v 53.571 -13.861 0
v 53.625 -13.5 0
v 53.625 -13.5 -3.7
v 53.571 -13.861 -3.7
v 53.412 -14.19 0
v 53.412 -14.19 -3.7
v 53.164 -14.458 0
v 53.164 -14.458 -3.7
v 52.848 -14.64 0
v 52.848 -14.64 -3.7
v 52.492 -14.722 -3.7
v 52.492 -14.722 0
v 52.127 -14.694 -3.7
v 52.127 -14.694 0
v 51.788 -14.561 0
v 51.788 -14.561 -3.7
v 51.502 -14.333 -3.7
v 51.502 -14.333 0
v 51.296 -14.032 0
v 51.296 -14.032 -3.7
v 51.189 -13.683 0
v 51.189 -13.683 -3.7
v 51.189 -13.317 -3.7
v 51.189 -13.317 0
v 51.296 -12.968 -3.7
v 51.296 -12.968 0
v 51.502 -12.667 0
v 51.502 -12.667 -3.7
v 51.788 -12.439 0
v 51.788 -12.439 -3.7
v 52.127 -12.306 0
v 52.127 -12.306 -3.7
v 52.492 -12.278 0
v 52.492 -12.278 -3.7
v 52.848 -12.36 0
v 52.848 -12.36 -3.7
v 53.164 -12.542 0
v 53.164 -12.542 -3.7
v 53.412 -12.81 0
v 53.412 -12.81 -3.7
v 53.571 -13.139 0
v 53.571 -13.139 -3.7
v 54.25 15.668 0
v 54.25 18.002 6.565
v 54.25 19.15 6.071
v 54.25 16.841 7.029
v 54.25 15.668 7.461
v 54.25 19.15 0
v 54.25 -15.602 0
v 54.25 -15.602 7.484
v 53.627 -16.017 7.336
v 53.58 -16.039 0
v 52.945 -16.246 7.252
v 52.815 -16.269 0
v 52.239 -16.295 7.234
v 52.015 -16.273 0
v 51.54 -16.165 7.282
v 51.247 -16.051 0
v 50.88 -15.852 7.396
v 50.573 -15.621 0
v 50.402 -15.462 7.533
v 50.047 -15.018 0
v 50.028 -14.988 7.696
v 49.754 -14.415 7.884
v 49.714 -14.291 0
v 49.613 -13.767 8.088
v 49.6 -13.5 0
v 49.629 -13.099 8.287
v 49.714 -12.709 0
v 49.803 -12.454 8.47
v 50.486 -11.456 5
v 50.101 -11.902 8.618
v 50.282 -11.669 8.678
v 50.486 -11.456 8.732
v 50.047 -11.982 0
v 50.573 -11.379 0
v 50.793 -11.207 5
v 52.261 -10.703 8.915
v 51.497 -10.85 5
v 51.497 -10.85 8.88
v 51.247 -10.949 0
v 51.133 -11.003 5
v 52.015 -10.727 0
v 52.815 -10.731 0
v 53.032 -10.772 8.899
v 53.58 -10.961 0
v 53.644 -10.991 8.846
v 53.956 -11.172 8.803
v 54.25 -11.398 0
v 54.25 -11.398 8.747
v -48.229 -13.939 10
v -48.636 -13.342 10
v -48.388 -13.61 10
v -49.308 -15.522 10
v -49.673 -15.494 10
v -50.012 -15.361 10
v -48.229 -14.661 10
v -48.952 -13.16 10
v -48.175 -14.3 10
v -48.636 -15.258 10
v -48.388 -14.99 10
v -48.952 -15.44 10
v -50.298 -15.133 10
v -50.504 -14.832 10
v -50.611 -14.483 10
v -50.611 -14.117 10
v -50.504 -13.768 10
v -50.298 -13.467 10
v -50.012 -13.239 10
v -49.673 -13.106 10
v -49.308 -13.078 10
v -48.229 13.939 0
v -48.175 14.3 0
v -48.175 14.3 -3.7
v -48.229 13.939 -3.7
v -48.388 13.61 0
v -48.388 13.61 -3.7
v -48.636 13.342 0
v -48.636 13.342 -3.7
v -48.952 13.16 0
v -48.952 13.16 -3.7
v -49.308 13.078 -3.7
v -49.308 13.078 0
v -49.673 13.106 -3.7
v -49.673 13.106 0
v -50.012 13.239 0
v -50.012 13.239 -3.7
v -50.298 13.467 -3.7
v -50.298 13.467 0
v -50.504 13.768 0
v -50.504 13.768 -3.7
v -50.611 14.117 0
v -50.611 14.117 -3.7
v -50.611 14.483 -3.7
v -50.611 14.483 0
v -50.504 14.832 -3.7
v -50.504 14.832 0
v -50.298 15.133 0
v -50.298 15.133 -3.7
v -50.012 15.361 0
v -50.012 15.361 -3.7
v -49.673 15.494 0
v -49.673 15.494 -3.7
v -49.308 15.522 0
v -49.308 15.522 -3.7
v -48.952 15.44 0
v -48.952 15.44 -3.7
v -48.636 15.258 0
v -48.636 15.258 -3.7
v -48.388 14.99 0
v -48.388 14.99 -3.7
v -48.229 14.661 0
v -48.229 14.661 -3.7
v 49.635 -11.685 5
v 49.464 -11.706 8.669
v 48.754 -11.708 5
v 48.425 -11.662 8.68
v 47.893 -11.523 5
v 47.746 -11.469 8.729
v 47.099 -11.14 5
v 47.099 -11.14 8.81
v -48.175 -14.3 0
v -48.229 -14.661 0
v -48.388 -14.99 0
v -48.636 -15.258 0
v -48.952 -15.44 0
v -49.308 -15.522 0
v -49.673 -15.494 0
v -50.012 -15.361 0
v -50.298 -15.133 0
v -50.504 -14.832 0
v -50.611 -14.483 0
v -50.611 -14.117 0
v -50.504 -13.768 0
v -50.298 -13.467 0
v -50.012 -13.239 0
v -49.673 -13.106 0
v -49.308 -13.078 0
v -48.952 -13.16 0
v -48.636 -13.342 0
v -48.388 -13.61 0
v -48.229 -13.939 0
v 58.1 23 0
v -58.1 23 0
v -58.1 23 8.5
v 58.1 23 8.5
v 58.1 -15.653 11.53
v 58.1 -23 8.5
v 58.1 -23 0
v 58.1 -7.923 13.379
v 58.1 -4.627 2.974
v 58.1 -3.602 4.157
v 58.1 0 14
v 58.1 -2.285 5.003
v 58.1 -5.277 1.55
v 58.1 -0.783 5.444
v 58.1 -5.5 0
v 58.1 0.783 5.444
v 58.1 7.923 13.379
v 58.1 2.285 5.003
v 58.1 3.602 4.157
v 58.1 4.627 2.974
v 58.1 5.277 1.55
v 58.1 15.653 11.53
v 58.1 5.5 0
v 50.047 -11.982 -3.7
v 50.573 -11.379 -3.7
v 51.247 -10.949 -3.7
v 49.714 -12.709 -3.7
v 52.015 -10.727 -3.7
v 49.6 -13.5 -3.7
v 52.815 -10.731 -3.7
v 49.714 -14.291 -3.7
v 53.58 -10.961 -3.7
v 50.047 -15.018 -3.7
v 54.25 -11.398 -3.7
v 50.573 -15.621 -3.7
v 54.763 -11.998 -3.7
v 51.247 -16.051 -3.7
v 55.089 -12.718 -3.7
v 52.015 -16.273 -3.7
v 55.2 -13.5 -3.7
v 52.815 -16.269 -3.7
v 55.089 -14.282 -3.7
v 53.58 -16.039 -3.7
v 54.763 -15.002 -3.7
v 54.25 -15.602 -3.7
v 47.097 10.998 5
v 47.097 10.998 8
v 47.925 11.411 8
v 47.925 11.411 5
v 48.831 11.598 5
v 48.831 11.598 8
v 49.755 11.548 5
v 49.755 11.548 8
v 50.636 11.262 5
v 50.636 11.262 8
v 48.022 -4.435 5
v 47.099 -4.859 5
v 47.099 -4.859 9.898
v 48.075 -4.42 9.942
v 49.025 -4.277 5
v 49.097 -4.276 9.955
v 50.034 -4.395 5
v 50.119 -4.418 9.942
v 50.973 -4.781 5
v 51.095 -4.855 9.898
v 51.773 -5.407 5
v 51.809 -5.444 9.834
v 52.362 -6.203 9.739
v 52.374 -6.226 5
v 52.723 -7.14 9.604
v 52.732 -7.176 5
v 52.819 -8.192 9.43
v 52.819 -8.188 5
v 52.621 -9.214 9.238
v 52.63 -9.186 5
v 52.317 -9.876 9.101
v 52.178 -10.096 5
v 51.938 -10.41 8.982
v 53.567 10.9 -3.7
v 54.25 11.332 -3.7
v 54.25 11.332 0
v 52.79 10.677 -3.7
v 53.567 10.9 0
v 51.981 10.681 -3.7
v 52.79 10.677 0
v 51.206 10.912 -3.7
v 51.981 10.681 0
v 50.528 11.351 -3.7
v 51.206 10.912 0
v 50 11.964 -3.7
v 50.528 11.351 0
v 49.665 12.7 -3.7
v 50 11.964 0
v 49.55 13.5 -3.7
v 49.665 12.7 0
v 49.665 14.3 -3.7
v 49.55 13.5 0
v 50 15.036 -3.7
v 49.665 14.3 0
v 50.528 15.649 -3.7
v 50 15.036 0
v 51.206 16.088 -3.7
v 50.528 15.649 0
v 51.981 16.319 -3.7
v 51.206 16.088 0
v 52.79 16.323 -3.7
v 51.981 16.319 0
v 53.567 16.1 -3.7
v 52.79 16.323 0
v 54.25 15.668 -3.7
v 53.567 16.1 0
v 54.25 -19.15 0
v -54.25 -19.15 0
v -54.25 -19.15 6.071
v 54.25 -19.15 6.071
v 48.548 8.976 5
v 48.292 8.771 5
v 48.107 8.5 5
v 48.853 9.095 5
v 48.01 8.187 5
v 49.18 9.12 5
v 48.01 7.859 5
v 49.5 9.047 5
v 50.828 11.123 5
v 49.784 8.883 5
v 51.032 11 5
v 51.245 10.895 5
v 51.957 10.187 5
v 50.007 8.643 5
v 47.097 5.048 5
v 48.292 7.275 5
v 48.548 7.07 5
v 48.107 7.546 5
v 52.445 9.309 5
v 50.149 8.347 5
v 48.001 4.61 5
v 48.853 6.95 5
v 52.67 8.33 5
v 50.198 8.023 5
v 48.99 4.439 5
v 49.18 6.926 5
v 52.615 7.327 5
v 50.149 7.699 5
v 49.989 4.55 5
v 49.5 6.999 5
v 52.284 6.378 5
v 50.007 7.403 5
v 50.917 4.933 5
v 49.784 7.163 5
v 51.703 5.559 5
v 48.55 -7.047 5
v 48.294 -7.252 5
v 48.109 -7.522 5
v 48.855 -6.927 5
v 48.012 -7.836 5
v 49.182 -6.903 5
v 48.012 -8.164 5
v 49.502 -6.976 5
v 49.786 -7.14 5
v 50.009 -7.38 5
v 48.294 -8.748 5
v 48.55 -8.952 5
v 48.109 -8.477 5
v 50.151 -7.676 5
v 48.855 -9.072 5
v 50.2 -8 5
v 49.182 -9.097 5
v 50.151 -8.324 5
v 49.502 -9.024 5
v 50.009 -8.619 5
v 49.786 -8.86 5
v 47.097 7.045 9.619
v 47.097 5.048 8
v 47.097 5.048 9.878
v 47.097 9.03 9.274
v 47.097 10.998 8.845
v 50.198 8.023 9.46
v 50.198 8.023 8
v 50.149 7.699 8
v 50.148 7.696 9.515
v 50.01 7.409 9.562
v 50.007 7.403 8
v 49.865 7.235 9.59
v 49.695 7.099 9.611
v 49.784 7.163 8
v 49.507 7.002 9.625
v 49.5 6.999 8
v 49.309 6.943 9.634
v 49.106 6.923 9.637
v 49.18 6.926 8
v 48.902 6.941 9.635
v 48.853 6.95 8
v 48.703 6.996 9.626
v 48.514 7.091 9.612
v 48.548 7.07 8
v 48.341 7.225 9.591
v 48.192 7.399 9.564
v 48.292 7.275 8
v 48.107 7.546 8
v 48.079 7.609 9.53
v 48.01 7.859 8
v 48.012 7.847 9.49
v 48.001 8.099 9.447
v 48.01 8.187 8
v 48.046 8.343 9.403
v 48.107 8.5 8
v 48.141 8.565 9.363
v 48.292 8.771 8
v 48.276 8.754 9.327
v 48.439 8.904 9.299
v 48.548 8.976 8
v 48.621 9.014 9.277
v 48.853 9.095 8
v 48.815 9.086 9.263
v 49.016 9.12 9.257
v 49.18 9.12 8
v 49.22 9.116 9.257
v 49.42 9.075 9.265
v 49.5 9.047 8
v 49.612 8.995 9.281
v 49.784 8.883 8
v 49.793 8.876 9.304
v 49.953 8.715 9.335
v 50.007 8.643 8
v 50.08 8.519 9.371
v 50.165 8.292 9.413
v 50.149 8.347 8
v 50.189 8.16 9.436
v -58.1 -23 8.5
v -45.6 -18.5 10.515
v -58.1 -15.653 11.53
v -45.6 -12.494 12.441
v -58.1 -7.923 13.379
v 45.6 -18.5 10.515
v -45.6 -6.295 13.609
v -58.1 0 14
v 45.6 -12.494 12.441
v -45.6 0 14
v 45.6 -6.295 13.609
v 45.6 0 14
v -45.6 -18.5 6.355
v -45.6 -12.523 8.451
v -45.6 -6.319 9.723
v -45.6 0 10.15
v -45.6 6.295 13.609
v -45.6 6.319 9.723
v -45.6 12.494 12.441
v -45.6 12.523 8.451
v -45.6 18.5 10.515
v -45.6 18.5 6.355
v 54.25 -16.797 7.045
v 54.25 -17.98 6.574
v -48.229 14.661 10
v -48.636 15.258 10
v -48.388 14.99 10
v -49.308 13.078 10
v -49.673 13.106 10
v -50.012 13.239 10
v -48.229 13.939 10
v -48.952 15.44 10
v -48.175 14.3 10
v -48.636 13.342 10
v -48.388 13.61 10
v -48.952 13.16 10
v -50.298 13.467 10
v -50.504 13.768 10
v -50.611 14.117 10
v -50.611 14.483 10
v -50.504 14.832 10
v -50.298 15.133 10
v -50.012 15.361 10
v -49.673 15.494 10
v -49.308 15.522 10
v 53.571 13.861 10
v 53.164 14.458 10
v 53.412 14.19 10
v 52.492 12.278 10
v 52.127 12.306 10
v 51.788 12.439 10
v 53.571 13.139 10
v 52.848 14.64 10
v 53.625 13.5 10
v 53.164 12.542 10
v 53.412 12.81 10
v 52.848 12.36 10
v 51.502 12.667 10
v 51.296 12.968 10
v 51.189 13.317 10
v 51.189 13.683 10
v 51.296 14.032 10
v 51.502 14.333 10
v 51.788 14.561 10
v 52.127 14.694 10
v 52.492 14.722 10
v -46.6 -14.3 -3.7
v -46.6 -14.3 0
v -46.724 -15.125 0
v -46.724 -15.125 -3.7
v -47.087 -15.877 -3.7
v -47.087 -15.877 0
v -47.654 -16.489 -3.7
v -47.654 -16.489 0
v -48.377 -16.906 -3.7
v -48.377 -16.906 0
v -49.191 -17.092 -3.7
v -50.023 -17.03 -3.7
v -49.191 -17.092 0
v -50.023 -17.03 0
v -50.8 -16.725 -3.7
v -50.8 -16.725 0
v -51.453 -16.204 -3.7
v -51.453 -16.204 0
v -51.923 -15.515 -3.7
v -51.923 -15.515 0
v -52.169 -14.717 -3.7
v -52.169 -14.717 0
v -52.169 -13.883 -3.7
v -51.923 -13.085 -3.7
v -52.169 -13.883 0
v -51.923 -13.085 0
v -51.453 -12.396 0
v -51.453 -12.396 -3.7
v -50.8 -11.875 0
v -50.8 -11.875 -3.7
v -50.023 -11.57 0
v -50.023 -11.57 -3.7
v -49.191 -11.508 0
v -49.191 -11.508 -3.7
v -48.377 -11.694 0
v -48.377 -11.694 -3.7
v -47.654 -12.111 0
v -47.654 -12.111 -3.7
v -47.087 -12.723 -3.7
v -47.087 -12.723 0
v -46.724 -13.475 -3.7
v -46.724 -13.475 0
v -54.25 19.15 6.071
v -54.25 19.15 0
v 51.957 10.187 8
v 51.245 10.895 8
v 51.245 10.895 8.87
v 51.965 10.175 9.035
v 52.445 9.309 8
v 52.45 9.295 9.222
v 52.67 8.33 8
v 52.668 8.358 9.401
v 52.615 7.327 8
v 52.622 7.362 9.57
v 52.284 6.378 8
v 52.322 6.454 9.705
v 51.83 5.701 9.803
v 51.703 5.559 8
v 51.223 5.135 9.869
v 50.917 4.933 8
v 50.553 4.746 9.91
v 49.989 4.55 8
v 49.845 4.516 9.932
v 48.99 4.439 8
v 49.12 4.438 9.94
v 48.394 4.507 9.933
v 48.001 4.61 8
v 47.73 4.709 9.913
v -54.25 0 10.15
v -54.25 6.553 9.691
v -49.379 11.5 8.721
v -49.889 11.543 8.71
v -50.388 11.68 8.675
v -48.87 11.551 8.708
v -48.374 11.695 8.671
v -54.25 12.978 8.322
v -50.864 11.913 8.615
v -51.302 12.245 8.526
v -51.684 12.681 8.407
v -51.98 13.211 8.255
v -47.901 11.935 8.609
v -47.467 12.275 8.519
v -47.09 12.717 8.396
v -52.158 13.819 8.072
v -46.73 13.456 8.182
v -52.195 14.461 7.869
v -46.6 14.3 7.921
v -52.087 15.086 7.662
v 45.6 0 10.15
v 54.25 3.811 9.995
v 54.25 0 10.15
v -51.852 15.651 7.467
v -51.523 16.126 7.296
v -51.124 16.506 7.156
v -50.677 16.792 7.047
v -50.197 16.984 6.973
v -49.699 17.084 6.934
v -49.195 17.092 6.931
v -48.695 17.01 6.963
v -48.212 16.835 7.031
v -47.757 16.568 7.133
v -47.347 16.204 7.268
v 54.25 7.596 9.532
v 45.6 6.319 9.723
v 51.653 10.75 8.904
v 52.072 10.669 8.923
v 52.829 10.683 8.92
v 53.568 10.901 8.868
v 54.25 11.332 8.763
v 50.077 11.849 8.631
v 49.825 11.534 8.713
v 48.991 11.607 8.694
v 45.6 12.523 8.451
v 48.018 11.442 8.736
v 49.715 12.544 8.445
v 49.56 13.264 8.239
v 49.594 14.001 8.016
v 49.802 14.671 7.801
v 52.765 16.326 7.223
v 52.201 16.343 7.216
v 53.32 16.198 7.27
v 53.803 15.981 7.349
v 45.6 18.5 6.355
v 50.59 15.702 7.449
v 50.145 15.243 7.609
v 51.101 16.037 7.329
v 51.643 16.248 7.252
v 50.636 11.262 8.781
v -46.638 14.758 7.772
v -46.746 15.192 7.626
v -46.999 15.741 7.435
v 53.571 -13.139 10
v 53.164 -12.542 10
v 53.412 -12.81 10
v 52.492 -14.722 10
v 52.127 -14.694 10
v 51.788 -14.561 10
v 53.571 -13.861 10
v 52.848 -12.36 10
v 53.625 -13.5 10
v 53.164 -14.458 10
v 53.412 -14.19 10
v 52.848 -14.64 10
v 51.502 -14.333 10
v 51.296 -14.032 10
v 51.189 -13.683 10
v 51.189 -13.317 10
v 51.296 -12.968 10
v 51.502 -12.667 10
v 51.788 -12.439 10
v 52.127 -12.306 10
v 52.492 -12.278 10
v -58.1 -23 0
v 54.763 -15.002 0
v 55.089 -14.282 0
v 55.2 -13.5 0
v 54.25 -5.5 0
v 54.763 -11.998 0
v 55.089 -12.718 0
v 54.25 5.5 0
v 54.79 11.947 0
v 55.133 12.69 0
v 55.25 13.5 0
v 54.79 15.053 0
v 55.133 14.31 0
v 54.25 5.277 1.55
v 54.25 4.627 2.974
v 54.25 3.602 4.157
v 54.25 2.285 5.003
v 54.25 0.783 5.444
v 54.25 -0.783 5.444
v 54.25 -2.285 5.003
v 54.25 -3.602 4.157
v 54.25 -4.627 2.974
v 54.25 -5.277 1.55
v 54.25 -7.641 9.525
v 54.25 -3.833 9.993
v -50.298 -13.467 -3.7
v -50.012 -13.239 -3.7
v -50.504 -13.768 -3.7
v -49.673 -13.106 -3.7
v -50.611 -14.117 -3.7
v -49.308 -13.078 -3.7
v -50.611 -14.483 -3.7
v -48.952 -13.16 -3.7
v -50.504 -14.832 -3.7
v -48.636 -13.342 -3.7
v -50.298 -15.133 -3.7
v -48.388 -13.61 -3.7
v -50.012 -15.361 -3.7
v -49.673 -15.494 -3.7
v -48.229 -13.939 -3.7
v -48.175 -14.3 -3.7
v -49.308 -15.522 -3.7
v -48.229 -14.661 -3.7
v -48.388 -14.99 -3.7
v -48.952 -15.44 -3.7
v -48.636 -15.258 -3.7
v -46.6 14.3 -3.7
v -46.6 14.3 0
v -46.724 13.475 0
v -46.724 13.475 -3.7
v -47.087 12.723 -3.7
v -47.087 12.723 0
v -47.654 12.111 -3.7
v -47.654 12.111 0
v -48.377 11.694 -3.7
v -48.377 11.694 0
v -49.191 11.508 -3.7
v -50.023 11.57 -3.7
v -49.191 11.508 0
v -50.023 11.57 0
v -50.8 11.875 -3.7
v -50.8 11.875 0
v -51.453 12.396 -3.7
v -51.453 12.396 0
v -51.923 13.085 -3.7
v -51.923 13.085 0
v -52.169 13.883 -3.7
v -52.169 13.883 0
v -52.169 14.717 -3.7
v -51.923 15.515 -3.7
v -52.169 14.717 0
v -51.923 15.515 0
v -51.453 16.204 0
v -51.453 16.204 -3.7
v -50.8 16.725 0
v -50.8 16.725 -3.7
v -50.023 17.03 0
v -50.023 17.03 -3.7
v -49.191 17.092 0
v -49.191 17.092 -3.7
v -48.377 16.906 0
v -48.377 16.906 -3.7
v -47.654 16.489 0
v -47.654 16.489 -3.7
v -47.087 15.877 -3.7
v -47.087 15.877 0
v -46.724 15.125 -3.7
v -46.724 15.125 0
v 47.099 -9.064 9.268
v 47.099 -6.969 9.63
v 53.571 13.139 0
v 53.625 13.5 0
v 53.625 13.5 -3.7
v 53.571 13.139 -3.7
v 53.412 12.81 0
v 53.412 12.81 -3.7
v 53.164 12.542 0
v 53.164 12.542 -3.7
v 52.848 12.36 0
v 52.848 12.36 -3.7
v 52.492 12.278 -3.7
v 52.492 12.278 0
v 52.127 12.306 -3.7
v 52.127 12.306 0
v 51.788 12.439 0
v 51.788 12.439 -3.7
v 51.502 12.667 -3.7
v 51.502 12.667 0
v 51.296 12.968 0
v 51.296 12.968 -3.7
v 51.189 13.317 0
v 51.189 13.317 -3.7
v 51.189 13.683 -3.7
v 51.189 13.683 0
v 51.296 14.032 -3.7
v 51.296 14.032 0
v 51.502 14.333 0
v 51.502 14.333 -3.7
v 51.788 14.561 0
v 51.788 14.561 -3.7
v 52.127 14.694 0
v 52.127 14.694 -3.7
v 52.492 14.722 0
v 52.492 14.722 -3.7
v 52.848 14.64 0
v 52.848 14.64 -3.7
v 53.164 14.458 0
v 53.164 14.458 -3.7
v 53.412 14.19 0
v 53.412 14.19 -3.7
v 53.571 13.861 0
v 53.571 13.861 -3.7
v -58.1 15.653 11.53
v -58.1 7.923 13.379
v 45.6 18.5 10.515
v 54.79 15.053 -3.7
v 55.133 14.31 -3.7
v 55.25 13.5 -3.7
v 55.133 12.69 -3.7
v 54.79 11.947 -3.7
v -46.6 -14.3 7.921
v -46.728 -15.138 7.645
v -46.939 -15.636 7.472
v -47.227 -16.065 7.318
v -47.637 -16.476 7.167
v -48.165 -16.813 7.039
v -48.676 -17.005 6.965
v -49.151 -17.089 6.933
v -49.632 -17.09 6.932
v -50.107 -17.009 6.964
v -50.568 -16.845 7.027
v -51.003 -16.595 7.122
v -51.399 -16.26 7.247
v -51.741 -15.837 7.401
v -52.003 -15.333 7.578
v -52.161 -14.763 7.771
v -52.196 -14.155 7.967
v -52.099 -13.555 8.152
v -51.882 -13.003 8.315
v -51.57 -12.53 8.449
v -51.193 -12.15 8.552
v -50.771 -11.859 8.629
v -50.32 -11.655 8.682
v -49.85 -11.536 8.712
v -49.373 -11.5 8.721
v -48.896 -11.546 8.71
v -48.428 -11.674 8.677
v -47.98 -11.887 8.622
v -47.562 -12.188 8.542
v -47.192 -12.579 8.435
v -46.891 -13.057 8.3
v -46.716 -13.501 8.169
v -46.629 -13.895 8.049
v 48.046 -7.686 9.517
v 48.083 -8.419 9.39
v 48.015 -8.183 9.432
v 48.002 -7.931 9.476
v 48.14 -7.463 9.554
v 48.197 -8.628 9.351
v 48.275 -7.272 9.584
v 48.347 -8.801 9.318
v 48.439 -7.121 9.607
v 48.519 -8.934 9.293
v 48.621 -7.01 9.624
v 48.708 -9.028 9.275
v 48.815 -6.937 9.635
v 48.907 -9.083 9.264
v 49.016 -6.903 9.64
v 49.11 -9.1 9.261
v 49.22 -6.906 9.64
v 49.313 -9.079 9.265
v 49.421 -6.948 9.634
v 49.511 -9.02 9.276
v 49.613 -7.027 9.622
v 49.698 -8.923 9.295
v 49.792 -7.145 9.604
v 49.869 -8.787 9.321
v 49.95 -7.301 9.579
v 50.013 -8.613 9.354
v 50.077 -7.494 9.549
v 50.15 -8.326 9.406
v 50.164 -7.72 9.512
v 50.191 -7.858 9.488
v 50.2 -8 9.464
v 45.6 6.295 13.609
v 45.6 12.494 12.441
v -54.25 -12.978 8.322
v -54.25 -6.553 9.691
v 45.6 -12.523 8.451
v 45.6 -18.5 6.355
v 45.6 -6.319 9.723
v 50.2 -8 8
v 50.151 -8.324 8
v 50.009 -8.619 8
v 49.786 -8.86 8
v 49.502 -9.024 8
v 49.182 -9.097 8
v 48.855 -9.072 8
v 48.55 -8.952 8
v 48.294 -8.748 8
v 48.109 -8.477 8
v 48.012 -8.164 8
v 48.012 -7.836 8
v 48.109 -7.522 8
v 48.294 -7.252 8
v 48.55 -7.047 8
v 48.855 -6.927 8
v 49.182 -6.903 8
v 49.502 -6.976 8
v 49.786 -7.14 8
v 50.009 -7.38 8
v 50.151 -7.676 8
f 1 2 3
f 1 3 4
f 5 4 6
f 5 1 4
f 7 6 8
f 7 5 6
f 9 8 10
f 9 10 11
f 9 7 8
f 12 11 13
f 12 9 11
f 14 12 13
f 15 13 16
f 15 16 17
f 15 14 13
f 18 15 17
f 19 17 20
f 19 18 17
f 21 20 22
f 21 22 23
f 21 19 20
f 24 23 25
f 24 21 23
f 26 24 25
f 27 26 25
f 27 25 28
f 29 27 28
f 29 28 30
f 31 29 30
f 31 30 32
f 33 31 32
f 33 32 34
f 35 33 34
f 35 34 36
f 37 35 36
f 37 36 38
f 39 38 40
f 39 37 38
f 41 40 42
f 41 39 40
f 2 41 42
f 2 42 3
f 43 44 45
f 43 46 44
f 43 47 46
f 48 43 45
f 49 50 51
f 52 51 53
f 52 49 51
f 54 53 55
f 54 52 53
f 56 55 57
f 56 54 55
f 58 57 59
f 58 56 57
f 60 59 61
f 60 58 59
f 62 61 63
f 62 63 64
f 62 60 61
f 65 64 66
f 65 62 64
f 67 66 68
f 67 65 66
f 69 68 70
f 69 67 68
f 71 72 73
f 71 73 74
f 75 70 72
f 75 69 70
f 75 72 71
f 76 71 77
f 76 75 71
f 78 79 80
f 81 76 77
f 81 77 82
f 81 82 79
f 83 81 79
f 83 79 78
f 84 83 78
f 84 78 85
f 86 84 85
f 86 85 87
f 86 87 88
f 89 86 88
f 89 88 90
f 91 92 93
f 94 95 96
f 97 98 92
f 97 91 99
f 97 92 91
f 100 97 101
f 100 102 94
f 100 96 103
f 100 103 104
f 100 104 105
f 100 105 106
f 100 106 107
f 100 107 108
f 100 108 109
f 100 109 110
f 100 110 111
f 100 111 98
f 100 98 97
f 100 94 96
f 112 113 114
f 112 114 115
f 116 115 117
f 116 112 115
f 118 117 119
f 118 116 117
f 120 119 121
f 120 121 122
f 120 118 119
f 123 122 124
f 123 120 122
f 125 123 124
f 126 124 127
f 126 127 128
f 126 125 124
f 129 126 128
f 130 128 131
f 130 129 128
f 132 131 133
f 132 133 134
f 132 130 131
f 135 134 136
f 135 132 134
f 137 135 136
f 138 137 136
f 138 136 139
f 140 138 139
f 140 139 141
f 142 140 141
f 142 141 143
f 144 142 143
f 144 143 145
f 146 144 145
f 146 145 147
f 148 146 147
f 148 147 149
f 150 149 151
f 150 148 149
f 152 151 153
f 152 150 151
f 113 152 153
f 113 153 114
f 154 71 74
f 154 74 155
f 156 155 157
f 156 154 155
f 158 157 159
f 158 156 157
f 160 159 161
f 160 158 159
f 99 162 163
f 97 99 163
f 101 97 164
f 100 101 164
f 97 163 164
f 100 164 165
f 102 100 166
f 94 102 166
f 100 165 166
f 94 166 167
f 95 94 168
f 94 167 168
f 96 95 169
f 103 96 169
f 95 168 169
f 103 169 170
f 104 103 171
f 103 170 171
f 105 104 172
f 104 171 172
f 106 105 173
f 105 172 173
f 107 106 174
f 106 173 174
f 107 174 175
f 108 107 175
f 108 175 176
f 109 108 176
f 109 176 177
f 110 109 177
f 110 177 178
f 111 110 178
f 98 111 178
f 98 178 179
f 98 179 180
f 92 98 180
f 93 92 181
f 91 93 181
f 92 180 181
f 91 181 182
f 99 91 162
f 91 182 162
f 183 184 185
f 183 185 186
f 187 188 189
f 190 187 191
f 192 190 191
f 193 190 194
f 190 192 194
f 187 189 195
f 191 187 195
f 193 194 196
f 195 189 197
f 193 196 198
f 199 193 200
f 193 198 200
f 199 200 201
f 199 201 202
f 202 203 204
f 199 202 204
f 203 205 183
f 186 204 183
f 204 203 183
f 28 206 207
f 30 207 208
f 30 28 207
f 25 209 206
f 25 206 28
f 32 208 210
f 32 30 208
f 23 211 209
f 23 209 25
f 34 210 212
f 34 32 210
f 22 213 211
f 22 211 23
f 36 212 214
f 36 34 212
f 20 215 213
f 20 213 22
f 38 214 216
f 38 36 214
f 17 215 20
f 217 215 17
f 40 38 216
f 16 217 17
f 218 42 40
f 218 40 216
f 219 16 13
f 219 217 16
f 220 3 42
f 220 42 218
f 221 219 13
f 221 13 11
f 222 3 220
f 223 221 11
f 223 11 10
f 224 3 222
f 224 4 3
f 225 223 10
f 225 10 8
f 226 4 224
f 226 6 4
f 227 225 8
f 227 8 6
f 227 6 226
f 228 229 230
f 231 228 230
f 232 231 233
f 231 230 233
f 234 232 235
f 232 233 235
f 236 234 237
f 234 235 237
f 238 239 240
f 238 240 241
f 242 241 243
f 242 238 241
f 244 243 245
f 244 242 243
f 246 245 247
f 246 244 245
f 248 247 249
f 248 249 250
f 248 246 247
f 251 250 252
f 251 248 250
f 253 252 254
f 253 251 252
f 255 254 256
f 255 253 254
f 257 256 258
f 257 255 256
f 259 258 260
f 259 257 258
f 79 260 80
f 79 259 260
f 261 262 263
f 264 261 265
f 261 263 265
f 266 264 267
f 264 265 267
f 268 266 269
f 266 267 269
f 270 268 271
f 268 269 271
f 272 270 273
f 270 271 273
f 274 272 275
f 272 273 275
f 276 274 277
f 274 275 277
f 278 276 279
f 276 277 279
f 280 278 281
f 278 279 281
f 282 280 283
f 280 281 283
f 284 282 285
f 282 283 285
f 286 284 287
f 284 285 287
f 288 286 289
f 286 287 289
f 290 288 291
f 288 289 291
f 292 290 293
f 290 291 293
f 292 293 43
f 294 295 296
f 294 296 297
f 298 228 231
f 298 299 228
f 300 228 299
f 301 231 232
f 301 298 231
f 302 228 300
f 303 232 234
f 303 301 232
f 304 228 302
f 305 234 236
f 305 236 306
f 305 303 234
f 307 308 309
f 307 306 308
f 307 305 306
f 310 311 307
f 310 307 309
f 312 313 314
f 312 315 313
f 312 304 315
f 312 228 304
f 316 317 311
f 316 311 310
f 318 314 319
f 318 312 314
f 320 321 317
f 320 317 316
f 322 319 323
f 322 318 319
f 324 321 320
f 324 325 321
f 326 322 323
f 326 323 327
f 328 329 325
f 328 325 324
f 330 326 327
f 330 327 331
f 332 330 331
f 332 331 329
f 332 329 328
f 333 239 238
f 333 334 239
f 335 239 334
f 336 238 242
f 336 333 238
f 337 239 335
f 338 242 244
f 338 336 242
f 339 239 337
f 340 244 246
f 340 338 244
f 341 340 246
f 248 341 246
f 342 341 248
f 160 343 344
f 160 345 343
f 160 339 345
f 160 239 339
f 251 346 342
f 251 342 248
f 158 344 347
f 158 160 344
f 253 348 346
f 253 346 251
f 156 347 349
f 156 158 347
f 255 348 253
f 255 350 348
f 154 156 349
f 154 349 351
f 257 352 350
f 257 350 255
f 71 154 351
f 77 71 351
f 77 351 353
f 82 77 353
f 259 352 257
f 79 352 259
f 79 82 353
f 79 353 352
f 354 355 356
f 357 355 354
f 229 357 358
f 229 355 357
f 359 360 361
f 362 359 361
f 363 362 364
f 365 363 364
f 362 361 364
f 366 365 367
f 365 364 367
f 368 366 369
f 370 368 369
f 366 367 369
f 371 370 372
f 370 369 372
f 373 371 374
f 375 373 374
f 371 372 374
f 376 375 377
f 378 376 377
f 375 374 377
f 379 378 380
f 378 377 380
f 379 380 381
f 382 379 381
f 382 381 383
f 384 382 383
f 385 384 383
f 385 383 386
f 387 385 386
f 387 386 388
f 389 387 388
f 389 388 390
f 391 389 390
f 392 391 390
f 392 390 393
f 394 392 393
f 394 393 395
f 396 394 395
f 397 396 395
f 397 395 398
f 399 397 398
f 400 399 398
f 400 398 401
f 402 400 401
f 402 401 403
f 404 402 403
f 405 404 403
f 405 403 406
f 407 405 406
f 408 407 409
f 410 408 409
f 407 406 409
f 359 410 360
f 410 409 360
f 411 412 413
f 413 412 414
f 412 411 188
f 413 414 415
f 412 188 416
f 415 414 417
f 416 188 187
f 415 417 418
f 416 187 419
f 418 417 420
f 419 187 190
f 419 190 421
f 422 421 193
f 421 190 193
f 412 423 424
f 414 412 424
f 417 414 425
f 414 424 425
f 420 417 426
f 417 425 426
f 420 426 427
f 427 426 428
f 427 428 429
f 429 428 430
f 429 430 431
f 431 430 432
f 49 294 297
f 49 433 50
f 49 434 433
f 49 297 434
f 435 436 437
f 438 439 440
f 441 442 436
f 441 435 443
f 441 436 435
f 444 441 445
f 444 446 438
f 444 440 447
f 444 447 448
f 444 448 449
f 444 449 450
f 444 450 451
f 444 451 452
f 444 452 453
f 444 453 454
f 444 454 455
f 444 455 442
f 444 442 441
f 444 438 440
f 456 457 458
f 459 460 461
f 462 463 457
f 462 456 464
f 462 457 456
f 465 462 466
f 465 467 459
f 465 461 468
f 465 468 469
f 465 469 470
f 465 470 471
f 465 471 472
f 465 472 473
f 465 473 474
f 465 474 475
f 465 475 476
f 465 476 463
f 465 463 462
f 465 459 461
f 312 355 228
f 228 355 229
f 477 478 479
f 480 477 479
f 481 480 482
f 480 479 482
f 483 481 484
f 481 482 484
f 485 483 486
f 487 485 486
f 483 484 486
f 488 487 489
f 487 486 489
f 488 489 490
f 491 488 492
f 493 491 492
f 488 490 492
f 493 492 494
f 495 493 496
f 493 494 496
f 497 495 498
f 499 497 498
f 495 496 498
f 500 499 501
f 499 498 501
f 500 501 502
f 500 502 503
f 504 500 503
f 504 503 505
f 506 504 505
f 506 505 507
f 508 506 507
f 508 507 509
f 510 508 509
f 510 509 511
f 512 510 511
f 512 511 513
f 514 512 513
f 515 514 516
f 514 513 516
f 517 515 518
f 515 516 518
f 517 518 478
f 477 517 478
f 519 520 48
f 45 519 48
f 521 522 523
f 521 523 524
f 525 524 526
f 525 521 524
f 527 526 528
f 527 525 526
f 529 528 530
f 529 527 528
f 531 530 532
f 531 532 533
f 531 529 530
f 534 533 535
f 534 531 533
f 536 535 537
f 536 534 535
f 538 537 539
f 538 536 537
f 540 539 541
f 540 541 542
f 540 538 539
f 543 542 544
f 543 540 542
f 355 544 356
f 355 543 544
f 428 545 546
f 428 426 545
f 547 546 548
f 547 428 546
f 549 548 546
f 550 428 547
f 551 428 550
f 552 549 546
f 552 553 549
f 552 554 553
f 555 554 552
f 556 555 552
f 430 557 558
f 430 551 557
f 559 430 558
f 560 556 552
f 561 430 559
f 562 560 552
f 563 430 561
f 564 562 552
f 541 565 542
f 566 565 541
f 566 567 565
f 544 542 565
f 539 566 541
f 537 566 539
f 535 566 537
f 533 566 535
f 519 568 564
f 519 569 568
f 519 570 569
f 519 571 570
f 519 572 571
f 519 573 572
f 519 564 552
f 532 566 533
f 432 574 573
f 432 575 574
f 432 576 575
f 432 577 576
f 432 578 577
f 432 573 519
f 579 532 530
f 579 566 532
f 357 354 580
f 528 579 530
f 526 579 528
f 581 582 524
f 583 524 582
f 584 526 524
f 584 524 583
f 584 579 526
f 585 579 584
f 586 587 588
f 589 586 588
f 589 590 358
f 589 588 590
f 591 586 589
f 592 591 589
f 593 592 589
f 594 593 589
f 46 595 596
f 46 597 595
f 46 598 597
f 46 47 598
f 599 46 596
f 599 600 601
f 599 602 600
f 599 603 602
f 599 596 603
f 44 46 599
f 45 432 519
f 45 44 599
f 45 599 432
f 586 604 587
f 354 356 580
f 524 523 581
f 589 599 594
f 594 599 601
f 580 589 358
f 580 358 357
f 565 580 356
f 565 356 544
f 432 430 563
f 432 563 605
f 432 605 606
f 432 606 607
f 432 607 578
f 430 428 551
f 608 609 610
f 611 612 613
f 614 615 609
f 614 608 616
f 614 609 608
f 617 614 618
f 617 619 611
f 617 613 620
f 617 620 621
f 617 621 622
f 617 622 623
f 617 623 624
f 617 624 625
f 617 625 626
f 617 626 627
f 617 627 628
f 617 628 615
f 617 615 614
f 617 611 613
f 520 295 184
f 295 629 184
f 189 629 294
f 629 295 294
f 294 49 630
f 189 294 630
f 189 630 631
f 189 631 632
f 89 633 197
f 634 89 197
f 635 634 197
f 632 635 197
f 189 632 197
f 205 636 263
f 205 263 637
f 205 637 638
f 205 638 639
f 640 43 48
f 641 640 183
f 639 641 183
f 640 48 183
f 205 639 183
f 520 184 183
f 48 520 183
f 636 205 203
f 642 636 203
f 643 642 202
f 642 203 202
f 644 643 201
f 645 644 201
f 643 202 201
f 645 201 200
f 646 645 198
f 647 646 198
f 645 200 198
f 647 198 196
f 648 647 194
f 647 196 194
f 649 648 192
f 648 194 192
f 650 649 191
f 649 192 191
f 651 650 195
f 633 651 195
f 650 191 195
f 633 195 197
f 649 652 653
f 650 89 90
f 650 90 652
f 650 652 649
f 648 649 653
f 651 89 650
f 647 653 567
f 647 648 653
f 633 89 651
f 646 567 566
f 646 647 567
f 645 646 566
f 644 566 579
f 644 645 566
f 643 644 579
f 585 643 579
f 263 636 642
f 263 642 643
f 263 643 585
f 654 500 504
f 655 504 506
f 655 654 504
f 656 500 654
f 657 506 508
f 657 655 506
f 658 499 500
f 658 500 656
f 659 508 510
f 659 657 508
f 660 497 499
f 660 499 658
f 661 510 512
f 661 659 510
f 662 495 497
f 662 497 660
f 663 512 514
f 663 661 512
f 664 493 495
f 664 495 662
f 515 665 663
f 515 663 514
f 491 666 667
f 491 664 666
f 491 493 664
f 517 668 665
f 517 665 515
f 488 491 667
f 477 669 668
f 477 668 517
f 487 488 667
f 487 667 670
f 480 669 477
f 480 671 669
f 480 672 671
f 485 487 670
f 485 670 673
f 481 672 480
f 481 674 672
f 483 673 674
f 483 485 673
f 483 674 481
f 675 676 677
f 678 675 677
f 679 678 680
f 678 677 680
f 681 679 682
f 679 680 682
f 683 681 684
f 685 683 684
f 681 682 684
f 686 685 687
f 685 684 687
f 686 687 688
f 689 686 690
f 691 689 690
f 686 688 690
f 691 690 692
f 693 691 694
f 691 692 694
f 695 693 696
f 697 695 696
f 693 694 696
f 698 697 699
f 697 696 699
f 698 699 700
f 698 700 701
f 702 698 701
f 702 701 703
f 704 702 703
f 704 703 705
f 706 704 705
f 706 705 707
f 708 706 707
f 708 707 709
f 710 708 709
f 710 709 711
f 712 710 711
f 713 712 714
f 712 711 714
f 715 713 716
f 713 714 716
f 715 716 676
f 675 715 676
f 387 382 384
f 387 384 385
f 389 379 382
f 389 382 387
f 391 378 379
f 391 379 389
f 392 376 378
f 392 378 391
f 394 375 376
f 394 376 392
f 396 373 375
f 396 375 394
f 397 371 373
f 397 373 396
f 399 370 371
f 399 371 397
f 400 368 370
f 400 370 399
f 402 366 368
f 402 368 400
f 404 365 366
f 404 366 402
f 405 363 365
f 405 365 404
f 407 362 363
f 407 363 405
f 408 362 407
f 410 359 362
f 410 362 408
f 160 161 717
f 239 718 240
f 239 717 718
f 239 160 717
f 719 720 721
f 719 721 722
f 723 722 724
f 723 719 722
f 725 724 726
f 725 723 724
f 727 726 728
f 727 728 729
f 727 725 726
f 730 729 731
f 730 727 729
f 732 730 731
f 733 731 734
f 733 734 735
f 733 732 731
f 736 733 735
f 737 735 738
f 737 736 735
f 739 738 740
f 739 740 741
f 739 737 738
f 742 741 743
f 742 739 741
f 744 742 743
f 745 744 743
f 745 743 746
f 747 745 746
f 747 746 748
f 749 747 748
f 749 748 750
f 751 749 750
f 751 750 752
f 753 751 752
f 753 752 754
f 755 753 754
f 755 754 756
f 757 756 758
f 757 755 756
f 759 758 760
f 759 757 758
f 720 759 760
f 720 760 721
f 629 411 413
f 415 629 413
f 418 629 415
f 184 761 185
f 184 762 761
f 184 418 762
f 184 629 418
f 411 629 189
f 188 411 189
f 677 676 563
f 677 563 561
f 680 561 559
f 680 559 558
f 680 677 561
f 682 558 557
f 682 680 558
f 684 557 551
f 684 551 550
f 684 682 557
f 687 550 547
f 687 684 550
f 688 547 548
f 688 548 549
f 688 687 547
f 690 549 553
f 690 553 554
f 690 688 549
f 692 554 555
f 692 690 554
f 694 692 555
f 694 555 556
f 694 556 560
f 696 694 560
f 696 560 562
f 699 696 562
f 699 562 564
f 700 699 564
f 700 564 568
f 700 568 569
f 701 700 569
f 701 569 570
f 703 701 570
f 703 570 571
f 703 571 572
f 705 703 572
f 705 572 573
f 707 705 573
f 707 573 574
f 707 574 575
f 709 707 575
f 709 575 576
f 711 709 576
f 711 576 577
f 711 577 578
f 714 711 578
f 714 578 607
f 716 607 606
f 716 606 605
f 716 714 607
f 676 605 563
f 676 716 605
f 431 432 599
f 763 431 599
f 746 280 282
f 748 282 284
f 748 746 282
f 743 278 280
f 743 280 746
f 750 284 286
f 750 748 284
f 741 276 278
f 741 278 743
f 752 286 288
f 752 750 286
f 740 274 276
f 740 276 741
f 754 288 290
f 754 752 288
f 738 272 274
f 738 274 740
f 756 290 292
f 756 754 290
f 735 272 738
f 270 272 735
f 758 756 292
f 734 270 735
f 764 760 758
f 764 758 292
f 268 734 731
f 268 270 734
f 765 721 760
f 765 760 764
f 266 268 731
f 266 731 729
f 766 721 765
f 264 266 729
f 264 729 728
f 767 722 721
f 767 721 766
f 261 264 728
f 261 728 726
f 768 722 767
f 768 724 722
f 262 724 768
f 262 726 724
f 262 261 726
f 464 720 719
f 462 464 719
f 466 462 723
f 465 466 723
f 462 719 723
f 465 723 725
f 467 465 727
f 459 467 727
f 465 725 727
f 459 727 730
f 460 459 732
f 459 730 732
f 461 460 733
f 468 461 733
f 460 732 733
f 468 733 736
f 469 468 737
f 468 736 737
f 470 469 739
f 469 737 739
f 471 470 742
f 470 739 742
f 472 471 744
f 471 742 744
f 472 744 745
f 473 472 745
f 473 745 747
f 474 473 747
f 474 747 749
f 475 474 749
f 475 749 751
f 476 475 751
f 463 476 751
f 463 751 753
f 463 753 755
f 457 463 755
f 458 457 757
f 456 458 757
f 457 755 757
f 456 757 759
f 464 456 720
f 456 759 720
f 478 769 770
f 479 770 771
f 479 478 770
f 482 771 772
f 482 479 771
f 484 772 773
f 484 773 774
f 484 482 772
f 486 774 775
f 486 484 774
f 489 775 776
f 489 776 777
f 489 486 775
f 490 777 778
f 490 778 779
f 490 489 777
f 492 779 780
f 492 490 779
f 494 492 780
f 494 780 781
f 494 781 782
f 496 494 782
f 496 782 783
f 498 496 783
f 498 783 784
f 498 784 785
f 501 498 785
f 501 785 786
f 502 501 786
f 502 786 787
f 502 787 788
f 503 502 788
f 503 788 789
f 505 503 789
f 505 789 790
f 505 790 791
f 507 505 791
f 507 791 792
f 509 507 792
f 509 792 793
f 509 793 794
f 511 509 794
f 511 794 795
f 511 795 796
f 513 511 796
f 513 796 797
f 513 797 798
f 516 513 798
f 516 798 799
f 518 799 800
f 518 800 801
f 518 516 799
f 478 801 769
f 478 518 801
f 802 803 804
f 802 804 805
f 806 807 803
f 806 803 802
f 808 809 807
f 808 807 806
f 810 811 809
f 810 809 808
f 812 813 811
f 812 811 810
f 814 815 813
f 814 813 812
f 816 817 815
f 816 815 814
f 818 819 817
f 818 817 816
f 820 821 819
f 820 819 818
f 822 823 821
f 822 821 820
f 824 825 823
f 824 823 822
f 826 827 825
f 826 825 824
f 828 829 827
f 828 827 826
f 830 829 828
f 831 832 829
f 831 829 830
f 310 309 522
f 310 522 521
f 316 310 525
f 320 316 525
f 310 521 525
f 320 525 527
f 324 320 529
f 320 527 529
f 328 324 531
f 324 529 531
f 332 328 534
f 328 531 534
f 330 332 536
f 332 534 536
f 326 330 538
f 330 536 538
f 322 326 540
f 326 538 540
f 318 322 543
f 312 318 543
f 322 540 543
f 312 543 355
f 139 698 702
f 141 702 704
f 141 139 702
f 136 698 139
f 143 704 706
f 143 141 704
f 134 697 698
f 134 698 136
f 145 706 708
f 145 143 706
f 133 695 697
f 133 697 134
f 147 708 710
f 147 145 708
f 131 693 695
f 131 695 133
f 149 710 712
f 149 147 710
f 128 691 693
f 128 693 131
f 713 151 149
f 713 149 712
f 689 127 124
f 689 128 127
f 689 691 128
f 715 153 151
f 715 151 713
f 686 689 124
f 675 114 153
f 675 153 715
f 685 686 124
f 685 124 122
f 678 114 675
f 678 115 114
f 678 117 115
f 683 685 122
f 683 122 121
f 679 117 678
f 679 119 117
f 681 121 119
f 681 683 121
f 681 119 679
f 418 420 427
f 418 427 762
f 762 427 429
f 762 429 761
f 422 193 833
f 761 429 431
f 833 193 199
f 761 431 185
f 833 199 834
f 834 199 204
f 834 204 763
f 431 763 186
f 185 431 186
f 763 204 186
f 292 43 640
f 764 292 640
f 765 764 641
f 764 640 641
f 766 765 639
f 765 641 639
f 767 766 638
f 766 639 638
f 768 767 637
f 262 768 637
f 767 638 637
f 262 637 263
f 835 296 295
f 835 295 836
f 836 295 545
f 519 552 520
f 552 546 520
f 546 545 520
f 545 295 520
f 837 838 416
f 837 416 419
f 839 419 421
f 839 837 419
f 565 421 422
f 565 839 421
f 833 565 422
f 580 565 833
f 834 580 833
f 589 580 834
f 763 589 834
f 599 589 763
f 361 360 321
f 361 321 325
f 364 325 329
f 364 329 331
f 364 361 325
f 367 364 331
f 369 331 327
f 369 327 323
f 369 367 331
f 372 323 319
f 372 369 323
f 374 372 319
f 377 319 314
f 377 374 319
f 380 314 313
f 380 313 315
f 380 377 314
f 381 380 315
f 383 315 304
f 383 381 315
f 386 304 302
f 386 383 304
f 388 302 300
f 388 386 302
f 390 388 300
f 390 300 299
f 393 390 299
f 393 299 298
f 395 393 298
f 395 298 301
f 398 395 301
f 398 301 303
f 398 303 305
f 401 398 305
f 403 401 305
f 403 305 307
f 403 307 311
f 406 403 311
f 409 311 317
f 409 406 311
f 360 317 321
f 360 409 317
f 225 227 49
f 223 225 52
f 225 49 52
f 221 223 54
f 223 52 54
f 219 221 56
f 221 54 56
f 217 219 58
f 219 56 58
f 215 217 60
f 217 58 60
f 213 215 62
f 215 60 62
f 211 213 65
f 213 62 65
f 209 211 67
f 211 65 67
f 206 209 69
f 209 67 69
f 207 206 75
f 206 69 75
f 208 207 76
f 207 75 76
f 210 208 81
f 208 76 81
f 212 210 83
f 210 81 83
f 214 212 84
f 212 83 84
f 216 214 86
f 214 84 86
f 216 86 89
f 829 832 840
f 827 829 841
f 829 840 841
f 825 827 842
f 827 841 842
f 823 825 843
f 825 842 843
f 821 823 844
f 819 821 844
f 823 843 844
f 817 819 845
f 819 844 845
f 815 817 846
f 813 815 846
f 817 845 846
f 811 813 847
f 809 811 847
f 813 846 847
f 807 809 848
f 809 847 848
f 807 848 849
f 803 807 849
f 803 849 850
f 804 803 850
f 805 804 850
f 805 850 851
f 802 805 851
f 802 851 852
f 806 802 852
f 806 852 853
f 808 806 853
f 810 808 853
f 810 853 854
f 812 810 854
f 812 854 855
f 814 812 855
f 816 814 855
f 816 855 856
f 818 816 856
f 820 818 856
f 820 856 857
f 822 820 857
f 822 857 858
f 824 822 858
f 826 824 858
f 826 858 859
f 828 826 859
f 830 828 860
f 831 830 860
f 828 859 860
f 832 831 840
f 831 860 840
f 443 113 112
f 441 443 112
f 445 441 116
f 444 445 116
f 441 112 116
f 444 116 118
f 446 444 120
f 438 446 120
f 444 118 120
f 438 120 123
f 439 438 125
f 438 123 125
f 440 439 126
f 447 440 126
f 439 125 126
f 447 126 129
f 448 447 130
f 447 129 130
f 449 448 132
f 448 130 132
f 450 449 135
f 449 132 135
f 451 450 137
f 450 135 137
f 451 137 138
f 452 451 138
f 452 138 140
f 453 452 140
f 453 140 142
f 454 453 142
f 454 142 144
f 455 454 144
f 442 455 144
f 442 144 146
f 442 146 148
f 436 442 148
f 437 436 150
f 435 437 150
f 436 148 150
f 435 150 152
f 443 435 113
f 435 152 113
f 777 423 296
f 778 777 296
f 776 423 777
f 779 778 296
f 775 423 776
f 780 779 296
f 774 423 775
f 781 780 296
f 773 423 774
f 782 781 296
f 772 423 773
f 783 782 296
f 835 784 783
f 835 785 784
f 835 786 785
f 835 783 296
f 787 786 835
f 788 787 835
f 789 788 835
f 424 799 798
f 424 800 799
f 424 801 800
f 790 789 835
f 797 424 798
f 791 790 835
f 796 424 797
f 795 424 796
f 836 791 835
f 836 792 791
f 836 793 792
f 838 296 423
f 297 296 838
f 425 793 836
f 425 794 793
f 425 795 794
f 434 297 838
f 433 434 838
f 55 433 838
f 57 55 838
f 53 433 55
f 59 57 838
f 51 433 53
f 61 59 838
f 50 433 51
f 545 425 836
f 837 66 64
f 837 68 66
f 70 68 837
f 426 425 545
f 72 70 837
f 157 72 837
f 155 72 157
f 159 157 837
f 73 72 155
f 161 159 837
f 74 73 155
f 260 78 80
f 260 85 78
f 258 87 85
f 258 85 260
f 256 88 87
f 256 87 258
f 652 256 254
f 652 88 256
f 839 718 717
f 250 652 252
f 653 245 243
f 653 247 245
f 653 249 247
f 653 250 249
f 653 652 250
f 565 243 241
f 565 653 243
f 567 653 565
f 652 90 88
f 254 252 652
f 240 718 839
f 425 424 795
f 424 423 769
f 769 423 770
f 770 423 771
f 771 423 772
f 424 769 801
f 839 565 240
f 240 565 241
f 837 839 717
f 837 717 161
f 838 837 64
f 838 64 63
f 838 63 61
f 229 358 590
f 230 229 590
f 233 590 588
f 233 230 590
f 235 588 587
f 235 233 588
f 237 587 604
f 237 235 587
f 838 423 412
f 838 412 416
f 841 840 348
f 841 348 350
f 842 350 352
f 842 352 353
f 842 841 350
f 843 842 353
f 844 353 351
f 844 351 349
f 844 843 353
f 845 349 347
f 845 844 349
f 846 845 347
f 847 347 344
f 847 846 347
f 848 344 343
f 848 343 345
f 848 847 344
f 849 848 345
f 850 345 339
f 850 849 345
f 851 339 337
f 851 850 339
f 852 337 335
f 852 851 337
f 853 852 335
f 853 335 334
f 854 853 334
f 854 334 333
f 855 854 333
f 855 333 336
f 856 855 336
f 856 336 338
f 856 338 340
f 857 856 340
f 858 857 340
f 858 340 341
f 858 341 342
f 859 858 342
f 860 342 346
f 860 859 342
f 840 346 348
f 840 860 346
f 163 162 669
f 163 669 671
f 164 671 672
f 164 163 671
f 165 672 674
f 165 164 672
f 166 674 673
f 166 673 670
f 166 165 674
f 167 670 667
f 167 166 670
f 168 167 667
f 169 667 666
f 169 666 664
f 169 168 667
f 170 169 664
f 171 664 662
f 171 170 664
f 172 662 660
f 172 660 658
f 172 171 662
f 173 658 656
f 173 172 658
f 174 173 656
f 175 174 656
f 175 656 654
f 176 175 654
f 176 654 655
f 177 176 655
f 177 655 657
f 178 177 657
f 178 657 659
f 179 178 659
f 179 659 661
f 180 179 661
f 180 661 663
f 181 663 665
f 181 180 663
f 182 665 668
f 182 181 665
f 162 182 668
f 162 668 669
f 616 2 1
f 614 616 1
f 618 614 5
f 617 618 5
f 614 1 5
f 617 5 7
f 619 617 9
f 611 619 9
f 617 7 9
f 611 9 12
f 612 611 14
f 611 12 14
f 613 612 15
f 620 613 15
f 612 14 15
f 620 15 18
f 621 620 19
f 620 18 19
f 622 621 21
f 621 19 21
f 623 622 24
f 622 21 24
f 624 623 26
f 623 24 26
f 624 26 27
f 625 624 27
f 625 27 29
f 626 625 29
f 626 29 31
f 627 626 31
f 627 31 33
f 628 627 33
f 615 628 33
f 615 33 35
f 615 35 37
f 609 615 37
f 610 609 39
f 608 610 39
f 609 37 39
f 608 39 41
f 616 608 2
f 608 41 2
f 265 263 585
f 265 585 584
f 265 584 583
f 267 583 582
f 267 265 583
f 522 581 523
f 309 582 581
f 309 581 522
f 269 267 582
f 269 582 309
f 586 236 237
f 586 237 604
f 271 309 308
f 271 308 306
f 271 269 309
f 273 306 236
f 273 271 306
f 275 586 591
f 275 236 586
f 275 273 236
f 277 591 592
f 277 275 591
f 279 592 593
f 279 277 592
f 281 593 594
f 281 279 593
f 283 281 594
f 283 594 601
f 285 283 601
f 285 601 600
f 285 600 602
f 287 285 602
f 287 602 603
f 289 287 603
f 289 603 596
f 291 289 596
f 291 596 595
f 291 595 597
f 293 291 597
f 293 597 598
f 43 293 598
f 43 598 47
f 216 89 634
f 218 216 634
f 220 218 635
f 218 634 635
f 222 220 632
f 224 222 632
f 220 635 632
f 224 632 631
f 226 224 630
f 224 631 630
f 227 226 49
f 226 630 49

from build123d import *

# Parameters (mm, degrees)
F0_W           = 116.2
F0_H           = 46
F0_W_2         = 91.2
F0_H_2         = 37
F1_DEPTH       = 14
F3_DEPTH       = 116.201
F4_T           = -3.85
F5_W           = 91.2
F5_H           = 37
F6_DEPTH       = 14.001
F7_R           = 2.8
F7_R_2         = 2.85
F10_DEPTH      = 25
F11_R          = 1.225
F12_DEPTH      = 10
F14_R          = 1.1
F15_DEPTH      = 3
F15_DEPTH_BACK = 1.955065151
F16_R          = 1.225
F16_R_2        = 2.8
F17_DEPTH      = 3.7


with BuildPart() as f1:
    # F0 (on Top) → F1 (new body)
    with BuildSketch(Plane.XY):
        Rectangle(F0_W, F0_H)
        Rectangle(F0_W_2, F0_H_2, mode=Mode.SUBTRACT)
        Rectangle(F0_W_2, F0_H_2)
    extrude(amount=F1_DEPTH)

    # F2 (on face) → F3 (cut, through all)
    with BuildSketch(Plane.YZ.offset(58.1)):
        Polygon((23, 14), (23, 8.5), (26.9685778767, 8.2080848515), (26.9685778767, 18.4987988323), (-26.2719616294, 18.4987988323), (-26.2719616294, 8.5), (-23, 8.5), (-23, 14), (0, 14), align=None)
        with BuildLine():
            ThreePointArc((-23, 8.5), (-11.8242335904, 12.6058859234), (0, 14))
            Line((0, 14), (-23, 14))
            Line((-23, 14), (-23, 8.5))
        make_face()
        with BuildLine():
            ThreePointArc((0, 14), (11.8242335904, 12.6058859234), (23, 8.5))
            Line((23, 8.5), (23, 14))
            Line((23, 14), (0, 14))
        make_face()
    extrude(amount=-F3_DEPTH, mode=Mode.SUBTRACT)

    # F4
    f4_openings = [f1.faces().sort_by_distance(p)[0] for p in [
        (0, 0, 0),
    ]]
    offset(amount=F4_T, openings=f4_openings)

    # F5 (on Top) → F6 (cut, through all)
    with BuildSketch(Plane.XY):
        Rectangle(F5_W, F5_H)
    extrude(amount=F6_DEPTH, mode=Mode.SUBTRACT)

    # F7 (on face) → F8 (join, up to the next surface of F1)
    with BuildSketch(Plane(origin=(0, 0, 0), x_dir=(1, 0, 0), z_dir=(0, 0, -1))):
        with Locations((-49.4, 14.3)):
            Circle(F7_R)
        with Locations((-49.4, -14.3)):
            Circle(F7_R)
        with Locations((52.4, 13.5)):
            Circle(F7_R)
        with Locations((52.4, -13.5)):
            Circle(F7_R_2)
    extrude(until=Until.NEXT, dir=(0, 0, 1))

    # F9 (on face) → F10 (cut)
    with BuildSketch(Plane.YZ.offset(58.1)):
        with BuildLine():
            ThreePointArc((-5.5, 0), (0, -5.5), (5.5, 0))
            Line((5.5, 0), (-5.5, 0))
        make_face()
        with BuildLine():
            Line((-5.5, 0), (5.5, 0))
            ThreePointArc((5.5, 0), (0, 5.5), (-5.5, 0))
        make_face()
    extrude(amount=-F10_DEPTH, mode=Mode.SUBTRACT)

    # F11 (on face) → F12 (cut)
    with BuildSketch(Plane(origin=(0, 0, 0), x_dir=(1, 0, 0), z_dir=(0, 0, -1))):
        with Locations((-49.4, 14.3)):
            Circle(F11_R)
        with Locations((-49.4, -14.3)):
            Circle(F11_R)
        with Locations((52.4, 13.5)):
            Circle(F11_R)
        with Locations((52.4, -13.5)):
            Circle(F11_R)
    extrude(amount=-F12_DEPTH, mode=Mode.SUBTRACT)

    # F14 (on offset) → F15 (join, two sides)
    with BuildSketch(Plane(origin=(0, 0, 8), x_dir=(1, 0, 0), z_dir=(0, 0, -1))) as f15_sk:
        with BuildLine():
            Line((47.0988332987, 11.1403603734), (47.0988332987, 4.8591672747))
            ThreePointArc((47.0988332987, 4.8591672747), (52.8239783636, 7.999763824), (47.0988332987, 11.1403603734))
        make_face()
        with Locations((49.1, 7.999763824)):
            Circle(F14_R, mode=Mode.SUBTRACT)
        with BuildLine():
            ThreePointArc((47.0968177208, -10.9978726761), (52.6833744029, -8.0229183659), (47.0968177208, -5.0479640557))
            Line((47.0968177208, -5.0479640557), (47.0968177208, -10.9978726761))
        make_face()
        with Locations((49.0979844222, -8.0229183659)):
            Circle(F14_R, mode=Mode.SUBTRACT)
    extrude(amount=F15_DEPTH)
    extrude(f15_sk.sketch, amount=-F15_DEPTH_BACK)

    # F16 (on face) → F17 (join)
    with BuildSketch(Plane(origin=(0, 0, 0), x_dir=(1, 0, 0), z_dir=(0, 0, -1))):
        with BuildLine():
            ThreePointArc((54.25, 11.3982150443), (55.2, 13.5), (54.25, 15.6017849557))
            ThreePointArc((54.25, 15.6017849557), (49.6, 13.5), (54.25, 11.3982150443))
        make_face()
        with Locations((52.4, 13.5)):
            Circle(F16_R, mode=Mode.SUBTRACT)
        with BuildLine():
            ThreePointArc((54.25, -15.6679483389), (55.25, -13.5), (54.25, -11.3320516611))
            ThreePointArc((54.25, -11.3320516611), (49.55, -13.5), (54.25, -15.6679483389))
        make_face()
        with Locations((52.4, -13.5)):
            Circle(F16_R, mode=Mode.SUBTRACT)
        with Locations((-49.4, 14.3)):
            Circle(F16_R_2)
        with Locations((-49.4, 14.3)):
            Circle(F16_R, mode=Mode.SUBTRACT)
        with Locations((-49.4, -14.3)):
            Circle(F16_R_2)
        with Locations((-49.4, -14.3)):
            Circle(F16_R, mode=Mode.SUBTRACT)
    extrude(amount=F17_DEPTH)


solid = f1.part
